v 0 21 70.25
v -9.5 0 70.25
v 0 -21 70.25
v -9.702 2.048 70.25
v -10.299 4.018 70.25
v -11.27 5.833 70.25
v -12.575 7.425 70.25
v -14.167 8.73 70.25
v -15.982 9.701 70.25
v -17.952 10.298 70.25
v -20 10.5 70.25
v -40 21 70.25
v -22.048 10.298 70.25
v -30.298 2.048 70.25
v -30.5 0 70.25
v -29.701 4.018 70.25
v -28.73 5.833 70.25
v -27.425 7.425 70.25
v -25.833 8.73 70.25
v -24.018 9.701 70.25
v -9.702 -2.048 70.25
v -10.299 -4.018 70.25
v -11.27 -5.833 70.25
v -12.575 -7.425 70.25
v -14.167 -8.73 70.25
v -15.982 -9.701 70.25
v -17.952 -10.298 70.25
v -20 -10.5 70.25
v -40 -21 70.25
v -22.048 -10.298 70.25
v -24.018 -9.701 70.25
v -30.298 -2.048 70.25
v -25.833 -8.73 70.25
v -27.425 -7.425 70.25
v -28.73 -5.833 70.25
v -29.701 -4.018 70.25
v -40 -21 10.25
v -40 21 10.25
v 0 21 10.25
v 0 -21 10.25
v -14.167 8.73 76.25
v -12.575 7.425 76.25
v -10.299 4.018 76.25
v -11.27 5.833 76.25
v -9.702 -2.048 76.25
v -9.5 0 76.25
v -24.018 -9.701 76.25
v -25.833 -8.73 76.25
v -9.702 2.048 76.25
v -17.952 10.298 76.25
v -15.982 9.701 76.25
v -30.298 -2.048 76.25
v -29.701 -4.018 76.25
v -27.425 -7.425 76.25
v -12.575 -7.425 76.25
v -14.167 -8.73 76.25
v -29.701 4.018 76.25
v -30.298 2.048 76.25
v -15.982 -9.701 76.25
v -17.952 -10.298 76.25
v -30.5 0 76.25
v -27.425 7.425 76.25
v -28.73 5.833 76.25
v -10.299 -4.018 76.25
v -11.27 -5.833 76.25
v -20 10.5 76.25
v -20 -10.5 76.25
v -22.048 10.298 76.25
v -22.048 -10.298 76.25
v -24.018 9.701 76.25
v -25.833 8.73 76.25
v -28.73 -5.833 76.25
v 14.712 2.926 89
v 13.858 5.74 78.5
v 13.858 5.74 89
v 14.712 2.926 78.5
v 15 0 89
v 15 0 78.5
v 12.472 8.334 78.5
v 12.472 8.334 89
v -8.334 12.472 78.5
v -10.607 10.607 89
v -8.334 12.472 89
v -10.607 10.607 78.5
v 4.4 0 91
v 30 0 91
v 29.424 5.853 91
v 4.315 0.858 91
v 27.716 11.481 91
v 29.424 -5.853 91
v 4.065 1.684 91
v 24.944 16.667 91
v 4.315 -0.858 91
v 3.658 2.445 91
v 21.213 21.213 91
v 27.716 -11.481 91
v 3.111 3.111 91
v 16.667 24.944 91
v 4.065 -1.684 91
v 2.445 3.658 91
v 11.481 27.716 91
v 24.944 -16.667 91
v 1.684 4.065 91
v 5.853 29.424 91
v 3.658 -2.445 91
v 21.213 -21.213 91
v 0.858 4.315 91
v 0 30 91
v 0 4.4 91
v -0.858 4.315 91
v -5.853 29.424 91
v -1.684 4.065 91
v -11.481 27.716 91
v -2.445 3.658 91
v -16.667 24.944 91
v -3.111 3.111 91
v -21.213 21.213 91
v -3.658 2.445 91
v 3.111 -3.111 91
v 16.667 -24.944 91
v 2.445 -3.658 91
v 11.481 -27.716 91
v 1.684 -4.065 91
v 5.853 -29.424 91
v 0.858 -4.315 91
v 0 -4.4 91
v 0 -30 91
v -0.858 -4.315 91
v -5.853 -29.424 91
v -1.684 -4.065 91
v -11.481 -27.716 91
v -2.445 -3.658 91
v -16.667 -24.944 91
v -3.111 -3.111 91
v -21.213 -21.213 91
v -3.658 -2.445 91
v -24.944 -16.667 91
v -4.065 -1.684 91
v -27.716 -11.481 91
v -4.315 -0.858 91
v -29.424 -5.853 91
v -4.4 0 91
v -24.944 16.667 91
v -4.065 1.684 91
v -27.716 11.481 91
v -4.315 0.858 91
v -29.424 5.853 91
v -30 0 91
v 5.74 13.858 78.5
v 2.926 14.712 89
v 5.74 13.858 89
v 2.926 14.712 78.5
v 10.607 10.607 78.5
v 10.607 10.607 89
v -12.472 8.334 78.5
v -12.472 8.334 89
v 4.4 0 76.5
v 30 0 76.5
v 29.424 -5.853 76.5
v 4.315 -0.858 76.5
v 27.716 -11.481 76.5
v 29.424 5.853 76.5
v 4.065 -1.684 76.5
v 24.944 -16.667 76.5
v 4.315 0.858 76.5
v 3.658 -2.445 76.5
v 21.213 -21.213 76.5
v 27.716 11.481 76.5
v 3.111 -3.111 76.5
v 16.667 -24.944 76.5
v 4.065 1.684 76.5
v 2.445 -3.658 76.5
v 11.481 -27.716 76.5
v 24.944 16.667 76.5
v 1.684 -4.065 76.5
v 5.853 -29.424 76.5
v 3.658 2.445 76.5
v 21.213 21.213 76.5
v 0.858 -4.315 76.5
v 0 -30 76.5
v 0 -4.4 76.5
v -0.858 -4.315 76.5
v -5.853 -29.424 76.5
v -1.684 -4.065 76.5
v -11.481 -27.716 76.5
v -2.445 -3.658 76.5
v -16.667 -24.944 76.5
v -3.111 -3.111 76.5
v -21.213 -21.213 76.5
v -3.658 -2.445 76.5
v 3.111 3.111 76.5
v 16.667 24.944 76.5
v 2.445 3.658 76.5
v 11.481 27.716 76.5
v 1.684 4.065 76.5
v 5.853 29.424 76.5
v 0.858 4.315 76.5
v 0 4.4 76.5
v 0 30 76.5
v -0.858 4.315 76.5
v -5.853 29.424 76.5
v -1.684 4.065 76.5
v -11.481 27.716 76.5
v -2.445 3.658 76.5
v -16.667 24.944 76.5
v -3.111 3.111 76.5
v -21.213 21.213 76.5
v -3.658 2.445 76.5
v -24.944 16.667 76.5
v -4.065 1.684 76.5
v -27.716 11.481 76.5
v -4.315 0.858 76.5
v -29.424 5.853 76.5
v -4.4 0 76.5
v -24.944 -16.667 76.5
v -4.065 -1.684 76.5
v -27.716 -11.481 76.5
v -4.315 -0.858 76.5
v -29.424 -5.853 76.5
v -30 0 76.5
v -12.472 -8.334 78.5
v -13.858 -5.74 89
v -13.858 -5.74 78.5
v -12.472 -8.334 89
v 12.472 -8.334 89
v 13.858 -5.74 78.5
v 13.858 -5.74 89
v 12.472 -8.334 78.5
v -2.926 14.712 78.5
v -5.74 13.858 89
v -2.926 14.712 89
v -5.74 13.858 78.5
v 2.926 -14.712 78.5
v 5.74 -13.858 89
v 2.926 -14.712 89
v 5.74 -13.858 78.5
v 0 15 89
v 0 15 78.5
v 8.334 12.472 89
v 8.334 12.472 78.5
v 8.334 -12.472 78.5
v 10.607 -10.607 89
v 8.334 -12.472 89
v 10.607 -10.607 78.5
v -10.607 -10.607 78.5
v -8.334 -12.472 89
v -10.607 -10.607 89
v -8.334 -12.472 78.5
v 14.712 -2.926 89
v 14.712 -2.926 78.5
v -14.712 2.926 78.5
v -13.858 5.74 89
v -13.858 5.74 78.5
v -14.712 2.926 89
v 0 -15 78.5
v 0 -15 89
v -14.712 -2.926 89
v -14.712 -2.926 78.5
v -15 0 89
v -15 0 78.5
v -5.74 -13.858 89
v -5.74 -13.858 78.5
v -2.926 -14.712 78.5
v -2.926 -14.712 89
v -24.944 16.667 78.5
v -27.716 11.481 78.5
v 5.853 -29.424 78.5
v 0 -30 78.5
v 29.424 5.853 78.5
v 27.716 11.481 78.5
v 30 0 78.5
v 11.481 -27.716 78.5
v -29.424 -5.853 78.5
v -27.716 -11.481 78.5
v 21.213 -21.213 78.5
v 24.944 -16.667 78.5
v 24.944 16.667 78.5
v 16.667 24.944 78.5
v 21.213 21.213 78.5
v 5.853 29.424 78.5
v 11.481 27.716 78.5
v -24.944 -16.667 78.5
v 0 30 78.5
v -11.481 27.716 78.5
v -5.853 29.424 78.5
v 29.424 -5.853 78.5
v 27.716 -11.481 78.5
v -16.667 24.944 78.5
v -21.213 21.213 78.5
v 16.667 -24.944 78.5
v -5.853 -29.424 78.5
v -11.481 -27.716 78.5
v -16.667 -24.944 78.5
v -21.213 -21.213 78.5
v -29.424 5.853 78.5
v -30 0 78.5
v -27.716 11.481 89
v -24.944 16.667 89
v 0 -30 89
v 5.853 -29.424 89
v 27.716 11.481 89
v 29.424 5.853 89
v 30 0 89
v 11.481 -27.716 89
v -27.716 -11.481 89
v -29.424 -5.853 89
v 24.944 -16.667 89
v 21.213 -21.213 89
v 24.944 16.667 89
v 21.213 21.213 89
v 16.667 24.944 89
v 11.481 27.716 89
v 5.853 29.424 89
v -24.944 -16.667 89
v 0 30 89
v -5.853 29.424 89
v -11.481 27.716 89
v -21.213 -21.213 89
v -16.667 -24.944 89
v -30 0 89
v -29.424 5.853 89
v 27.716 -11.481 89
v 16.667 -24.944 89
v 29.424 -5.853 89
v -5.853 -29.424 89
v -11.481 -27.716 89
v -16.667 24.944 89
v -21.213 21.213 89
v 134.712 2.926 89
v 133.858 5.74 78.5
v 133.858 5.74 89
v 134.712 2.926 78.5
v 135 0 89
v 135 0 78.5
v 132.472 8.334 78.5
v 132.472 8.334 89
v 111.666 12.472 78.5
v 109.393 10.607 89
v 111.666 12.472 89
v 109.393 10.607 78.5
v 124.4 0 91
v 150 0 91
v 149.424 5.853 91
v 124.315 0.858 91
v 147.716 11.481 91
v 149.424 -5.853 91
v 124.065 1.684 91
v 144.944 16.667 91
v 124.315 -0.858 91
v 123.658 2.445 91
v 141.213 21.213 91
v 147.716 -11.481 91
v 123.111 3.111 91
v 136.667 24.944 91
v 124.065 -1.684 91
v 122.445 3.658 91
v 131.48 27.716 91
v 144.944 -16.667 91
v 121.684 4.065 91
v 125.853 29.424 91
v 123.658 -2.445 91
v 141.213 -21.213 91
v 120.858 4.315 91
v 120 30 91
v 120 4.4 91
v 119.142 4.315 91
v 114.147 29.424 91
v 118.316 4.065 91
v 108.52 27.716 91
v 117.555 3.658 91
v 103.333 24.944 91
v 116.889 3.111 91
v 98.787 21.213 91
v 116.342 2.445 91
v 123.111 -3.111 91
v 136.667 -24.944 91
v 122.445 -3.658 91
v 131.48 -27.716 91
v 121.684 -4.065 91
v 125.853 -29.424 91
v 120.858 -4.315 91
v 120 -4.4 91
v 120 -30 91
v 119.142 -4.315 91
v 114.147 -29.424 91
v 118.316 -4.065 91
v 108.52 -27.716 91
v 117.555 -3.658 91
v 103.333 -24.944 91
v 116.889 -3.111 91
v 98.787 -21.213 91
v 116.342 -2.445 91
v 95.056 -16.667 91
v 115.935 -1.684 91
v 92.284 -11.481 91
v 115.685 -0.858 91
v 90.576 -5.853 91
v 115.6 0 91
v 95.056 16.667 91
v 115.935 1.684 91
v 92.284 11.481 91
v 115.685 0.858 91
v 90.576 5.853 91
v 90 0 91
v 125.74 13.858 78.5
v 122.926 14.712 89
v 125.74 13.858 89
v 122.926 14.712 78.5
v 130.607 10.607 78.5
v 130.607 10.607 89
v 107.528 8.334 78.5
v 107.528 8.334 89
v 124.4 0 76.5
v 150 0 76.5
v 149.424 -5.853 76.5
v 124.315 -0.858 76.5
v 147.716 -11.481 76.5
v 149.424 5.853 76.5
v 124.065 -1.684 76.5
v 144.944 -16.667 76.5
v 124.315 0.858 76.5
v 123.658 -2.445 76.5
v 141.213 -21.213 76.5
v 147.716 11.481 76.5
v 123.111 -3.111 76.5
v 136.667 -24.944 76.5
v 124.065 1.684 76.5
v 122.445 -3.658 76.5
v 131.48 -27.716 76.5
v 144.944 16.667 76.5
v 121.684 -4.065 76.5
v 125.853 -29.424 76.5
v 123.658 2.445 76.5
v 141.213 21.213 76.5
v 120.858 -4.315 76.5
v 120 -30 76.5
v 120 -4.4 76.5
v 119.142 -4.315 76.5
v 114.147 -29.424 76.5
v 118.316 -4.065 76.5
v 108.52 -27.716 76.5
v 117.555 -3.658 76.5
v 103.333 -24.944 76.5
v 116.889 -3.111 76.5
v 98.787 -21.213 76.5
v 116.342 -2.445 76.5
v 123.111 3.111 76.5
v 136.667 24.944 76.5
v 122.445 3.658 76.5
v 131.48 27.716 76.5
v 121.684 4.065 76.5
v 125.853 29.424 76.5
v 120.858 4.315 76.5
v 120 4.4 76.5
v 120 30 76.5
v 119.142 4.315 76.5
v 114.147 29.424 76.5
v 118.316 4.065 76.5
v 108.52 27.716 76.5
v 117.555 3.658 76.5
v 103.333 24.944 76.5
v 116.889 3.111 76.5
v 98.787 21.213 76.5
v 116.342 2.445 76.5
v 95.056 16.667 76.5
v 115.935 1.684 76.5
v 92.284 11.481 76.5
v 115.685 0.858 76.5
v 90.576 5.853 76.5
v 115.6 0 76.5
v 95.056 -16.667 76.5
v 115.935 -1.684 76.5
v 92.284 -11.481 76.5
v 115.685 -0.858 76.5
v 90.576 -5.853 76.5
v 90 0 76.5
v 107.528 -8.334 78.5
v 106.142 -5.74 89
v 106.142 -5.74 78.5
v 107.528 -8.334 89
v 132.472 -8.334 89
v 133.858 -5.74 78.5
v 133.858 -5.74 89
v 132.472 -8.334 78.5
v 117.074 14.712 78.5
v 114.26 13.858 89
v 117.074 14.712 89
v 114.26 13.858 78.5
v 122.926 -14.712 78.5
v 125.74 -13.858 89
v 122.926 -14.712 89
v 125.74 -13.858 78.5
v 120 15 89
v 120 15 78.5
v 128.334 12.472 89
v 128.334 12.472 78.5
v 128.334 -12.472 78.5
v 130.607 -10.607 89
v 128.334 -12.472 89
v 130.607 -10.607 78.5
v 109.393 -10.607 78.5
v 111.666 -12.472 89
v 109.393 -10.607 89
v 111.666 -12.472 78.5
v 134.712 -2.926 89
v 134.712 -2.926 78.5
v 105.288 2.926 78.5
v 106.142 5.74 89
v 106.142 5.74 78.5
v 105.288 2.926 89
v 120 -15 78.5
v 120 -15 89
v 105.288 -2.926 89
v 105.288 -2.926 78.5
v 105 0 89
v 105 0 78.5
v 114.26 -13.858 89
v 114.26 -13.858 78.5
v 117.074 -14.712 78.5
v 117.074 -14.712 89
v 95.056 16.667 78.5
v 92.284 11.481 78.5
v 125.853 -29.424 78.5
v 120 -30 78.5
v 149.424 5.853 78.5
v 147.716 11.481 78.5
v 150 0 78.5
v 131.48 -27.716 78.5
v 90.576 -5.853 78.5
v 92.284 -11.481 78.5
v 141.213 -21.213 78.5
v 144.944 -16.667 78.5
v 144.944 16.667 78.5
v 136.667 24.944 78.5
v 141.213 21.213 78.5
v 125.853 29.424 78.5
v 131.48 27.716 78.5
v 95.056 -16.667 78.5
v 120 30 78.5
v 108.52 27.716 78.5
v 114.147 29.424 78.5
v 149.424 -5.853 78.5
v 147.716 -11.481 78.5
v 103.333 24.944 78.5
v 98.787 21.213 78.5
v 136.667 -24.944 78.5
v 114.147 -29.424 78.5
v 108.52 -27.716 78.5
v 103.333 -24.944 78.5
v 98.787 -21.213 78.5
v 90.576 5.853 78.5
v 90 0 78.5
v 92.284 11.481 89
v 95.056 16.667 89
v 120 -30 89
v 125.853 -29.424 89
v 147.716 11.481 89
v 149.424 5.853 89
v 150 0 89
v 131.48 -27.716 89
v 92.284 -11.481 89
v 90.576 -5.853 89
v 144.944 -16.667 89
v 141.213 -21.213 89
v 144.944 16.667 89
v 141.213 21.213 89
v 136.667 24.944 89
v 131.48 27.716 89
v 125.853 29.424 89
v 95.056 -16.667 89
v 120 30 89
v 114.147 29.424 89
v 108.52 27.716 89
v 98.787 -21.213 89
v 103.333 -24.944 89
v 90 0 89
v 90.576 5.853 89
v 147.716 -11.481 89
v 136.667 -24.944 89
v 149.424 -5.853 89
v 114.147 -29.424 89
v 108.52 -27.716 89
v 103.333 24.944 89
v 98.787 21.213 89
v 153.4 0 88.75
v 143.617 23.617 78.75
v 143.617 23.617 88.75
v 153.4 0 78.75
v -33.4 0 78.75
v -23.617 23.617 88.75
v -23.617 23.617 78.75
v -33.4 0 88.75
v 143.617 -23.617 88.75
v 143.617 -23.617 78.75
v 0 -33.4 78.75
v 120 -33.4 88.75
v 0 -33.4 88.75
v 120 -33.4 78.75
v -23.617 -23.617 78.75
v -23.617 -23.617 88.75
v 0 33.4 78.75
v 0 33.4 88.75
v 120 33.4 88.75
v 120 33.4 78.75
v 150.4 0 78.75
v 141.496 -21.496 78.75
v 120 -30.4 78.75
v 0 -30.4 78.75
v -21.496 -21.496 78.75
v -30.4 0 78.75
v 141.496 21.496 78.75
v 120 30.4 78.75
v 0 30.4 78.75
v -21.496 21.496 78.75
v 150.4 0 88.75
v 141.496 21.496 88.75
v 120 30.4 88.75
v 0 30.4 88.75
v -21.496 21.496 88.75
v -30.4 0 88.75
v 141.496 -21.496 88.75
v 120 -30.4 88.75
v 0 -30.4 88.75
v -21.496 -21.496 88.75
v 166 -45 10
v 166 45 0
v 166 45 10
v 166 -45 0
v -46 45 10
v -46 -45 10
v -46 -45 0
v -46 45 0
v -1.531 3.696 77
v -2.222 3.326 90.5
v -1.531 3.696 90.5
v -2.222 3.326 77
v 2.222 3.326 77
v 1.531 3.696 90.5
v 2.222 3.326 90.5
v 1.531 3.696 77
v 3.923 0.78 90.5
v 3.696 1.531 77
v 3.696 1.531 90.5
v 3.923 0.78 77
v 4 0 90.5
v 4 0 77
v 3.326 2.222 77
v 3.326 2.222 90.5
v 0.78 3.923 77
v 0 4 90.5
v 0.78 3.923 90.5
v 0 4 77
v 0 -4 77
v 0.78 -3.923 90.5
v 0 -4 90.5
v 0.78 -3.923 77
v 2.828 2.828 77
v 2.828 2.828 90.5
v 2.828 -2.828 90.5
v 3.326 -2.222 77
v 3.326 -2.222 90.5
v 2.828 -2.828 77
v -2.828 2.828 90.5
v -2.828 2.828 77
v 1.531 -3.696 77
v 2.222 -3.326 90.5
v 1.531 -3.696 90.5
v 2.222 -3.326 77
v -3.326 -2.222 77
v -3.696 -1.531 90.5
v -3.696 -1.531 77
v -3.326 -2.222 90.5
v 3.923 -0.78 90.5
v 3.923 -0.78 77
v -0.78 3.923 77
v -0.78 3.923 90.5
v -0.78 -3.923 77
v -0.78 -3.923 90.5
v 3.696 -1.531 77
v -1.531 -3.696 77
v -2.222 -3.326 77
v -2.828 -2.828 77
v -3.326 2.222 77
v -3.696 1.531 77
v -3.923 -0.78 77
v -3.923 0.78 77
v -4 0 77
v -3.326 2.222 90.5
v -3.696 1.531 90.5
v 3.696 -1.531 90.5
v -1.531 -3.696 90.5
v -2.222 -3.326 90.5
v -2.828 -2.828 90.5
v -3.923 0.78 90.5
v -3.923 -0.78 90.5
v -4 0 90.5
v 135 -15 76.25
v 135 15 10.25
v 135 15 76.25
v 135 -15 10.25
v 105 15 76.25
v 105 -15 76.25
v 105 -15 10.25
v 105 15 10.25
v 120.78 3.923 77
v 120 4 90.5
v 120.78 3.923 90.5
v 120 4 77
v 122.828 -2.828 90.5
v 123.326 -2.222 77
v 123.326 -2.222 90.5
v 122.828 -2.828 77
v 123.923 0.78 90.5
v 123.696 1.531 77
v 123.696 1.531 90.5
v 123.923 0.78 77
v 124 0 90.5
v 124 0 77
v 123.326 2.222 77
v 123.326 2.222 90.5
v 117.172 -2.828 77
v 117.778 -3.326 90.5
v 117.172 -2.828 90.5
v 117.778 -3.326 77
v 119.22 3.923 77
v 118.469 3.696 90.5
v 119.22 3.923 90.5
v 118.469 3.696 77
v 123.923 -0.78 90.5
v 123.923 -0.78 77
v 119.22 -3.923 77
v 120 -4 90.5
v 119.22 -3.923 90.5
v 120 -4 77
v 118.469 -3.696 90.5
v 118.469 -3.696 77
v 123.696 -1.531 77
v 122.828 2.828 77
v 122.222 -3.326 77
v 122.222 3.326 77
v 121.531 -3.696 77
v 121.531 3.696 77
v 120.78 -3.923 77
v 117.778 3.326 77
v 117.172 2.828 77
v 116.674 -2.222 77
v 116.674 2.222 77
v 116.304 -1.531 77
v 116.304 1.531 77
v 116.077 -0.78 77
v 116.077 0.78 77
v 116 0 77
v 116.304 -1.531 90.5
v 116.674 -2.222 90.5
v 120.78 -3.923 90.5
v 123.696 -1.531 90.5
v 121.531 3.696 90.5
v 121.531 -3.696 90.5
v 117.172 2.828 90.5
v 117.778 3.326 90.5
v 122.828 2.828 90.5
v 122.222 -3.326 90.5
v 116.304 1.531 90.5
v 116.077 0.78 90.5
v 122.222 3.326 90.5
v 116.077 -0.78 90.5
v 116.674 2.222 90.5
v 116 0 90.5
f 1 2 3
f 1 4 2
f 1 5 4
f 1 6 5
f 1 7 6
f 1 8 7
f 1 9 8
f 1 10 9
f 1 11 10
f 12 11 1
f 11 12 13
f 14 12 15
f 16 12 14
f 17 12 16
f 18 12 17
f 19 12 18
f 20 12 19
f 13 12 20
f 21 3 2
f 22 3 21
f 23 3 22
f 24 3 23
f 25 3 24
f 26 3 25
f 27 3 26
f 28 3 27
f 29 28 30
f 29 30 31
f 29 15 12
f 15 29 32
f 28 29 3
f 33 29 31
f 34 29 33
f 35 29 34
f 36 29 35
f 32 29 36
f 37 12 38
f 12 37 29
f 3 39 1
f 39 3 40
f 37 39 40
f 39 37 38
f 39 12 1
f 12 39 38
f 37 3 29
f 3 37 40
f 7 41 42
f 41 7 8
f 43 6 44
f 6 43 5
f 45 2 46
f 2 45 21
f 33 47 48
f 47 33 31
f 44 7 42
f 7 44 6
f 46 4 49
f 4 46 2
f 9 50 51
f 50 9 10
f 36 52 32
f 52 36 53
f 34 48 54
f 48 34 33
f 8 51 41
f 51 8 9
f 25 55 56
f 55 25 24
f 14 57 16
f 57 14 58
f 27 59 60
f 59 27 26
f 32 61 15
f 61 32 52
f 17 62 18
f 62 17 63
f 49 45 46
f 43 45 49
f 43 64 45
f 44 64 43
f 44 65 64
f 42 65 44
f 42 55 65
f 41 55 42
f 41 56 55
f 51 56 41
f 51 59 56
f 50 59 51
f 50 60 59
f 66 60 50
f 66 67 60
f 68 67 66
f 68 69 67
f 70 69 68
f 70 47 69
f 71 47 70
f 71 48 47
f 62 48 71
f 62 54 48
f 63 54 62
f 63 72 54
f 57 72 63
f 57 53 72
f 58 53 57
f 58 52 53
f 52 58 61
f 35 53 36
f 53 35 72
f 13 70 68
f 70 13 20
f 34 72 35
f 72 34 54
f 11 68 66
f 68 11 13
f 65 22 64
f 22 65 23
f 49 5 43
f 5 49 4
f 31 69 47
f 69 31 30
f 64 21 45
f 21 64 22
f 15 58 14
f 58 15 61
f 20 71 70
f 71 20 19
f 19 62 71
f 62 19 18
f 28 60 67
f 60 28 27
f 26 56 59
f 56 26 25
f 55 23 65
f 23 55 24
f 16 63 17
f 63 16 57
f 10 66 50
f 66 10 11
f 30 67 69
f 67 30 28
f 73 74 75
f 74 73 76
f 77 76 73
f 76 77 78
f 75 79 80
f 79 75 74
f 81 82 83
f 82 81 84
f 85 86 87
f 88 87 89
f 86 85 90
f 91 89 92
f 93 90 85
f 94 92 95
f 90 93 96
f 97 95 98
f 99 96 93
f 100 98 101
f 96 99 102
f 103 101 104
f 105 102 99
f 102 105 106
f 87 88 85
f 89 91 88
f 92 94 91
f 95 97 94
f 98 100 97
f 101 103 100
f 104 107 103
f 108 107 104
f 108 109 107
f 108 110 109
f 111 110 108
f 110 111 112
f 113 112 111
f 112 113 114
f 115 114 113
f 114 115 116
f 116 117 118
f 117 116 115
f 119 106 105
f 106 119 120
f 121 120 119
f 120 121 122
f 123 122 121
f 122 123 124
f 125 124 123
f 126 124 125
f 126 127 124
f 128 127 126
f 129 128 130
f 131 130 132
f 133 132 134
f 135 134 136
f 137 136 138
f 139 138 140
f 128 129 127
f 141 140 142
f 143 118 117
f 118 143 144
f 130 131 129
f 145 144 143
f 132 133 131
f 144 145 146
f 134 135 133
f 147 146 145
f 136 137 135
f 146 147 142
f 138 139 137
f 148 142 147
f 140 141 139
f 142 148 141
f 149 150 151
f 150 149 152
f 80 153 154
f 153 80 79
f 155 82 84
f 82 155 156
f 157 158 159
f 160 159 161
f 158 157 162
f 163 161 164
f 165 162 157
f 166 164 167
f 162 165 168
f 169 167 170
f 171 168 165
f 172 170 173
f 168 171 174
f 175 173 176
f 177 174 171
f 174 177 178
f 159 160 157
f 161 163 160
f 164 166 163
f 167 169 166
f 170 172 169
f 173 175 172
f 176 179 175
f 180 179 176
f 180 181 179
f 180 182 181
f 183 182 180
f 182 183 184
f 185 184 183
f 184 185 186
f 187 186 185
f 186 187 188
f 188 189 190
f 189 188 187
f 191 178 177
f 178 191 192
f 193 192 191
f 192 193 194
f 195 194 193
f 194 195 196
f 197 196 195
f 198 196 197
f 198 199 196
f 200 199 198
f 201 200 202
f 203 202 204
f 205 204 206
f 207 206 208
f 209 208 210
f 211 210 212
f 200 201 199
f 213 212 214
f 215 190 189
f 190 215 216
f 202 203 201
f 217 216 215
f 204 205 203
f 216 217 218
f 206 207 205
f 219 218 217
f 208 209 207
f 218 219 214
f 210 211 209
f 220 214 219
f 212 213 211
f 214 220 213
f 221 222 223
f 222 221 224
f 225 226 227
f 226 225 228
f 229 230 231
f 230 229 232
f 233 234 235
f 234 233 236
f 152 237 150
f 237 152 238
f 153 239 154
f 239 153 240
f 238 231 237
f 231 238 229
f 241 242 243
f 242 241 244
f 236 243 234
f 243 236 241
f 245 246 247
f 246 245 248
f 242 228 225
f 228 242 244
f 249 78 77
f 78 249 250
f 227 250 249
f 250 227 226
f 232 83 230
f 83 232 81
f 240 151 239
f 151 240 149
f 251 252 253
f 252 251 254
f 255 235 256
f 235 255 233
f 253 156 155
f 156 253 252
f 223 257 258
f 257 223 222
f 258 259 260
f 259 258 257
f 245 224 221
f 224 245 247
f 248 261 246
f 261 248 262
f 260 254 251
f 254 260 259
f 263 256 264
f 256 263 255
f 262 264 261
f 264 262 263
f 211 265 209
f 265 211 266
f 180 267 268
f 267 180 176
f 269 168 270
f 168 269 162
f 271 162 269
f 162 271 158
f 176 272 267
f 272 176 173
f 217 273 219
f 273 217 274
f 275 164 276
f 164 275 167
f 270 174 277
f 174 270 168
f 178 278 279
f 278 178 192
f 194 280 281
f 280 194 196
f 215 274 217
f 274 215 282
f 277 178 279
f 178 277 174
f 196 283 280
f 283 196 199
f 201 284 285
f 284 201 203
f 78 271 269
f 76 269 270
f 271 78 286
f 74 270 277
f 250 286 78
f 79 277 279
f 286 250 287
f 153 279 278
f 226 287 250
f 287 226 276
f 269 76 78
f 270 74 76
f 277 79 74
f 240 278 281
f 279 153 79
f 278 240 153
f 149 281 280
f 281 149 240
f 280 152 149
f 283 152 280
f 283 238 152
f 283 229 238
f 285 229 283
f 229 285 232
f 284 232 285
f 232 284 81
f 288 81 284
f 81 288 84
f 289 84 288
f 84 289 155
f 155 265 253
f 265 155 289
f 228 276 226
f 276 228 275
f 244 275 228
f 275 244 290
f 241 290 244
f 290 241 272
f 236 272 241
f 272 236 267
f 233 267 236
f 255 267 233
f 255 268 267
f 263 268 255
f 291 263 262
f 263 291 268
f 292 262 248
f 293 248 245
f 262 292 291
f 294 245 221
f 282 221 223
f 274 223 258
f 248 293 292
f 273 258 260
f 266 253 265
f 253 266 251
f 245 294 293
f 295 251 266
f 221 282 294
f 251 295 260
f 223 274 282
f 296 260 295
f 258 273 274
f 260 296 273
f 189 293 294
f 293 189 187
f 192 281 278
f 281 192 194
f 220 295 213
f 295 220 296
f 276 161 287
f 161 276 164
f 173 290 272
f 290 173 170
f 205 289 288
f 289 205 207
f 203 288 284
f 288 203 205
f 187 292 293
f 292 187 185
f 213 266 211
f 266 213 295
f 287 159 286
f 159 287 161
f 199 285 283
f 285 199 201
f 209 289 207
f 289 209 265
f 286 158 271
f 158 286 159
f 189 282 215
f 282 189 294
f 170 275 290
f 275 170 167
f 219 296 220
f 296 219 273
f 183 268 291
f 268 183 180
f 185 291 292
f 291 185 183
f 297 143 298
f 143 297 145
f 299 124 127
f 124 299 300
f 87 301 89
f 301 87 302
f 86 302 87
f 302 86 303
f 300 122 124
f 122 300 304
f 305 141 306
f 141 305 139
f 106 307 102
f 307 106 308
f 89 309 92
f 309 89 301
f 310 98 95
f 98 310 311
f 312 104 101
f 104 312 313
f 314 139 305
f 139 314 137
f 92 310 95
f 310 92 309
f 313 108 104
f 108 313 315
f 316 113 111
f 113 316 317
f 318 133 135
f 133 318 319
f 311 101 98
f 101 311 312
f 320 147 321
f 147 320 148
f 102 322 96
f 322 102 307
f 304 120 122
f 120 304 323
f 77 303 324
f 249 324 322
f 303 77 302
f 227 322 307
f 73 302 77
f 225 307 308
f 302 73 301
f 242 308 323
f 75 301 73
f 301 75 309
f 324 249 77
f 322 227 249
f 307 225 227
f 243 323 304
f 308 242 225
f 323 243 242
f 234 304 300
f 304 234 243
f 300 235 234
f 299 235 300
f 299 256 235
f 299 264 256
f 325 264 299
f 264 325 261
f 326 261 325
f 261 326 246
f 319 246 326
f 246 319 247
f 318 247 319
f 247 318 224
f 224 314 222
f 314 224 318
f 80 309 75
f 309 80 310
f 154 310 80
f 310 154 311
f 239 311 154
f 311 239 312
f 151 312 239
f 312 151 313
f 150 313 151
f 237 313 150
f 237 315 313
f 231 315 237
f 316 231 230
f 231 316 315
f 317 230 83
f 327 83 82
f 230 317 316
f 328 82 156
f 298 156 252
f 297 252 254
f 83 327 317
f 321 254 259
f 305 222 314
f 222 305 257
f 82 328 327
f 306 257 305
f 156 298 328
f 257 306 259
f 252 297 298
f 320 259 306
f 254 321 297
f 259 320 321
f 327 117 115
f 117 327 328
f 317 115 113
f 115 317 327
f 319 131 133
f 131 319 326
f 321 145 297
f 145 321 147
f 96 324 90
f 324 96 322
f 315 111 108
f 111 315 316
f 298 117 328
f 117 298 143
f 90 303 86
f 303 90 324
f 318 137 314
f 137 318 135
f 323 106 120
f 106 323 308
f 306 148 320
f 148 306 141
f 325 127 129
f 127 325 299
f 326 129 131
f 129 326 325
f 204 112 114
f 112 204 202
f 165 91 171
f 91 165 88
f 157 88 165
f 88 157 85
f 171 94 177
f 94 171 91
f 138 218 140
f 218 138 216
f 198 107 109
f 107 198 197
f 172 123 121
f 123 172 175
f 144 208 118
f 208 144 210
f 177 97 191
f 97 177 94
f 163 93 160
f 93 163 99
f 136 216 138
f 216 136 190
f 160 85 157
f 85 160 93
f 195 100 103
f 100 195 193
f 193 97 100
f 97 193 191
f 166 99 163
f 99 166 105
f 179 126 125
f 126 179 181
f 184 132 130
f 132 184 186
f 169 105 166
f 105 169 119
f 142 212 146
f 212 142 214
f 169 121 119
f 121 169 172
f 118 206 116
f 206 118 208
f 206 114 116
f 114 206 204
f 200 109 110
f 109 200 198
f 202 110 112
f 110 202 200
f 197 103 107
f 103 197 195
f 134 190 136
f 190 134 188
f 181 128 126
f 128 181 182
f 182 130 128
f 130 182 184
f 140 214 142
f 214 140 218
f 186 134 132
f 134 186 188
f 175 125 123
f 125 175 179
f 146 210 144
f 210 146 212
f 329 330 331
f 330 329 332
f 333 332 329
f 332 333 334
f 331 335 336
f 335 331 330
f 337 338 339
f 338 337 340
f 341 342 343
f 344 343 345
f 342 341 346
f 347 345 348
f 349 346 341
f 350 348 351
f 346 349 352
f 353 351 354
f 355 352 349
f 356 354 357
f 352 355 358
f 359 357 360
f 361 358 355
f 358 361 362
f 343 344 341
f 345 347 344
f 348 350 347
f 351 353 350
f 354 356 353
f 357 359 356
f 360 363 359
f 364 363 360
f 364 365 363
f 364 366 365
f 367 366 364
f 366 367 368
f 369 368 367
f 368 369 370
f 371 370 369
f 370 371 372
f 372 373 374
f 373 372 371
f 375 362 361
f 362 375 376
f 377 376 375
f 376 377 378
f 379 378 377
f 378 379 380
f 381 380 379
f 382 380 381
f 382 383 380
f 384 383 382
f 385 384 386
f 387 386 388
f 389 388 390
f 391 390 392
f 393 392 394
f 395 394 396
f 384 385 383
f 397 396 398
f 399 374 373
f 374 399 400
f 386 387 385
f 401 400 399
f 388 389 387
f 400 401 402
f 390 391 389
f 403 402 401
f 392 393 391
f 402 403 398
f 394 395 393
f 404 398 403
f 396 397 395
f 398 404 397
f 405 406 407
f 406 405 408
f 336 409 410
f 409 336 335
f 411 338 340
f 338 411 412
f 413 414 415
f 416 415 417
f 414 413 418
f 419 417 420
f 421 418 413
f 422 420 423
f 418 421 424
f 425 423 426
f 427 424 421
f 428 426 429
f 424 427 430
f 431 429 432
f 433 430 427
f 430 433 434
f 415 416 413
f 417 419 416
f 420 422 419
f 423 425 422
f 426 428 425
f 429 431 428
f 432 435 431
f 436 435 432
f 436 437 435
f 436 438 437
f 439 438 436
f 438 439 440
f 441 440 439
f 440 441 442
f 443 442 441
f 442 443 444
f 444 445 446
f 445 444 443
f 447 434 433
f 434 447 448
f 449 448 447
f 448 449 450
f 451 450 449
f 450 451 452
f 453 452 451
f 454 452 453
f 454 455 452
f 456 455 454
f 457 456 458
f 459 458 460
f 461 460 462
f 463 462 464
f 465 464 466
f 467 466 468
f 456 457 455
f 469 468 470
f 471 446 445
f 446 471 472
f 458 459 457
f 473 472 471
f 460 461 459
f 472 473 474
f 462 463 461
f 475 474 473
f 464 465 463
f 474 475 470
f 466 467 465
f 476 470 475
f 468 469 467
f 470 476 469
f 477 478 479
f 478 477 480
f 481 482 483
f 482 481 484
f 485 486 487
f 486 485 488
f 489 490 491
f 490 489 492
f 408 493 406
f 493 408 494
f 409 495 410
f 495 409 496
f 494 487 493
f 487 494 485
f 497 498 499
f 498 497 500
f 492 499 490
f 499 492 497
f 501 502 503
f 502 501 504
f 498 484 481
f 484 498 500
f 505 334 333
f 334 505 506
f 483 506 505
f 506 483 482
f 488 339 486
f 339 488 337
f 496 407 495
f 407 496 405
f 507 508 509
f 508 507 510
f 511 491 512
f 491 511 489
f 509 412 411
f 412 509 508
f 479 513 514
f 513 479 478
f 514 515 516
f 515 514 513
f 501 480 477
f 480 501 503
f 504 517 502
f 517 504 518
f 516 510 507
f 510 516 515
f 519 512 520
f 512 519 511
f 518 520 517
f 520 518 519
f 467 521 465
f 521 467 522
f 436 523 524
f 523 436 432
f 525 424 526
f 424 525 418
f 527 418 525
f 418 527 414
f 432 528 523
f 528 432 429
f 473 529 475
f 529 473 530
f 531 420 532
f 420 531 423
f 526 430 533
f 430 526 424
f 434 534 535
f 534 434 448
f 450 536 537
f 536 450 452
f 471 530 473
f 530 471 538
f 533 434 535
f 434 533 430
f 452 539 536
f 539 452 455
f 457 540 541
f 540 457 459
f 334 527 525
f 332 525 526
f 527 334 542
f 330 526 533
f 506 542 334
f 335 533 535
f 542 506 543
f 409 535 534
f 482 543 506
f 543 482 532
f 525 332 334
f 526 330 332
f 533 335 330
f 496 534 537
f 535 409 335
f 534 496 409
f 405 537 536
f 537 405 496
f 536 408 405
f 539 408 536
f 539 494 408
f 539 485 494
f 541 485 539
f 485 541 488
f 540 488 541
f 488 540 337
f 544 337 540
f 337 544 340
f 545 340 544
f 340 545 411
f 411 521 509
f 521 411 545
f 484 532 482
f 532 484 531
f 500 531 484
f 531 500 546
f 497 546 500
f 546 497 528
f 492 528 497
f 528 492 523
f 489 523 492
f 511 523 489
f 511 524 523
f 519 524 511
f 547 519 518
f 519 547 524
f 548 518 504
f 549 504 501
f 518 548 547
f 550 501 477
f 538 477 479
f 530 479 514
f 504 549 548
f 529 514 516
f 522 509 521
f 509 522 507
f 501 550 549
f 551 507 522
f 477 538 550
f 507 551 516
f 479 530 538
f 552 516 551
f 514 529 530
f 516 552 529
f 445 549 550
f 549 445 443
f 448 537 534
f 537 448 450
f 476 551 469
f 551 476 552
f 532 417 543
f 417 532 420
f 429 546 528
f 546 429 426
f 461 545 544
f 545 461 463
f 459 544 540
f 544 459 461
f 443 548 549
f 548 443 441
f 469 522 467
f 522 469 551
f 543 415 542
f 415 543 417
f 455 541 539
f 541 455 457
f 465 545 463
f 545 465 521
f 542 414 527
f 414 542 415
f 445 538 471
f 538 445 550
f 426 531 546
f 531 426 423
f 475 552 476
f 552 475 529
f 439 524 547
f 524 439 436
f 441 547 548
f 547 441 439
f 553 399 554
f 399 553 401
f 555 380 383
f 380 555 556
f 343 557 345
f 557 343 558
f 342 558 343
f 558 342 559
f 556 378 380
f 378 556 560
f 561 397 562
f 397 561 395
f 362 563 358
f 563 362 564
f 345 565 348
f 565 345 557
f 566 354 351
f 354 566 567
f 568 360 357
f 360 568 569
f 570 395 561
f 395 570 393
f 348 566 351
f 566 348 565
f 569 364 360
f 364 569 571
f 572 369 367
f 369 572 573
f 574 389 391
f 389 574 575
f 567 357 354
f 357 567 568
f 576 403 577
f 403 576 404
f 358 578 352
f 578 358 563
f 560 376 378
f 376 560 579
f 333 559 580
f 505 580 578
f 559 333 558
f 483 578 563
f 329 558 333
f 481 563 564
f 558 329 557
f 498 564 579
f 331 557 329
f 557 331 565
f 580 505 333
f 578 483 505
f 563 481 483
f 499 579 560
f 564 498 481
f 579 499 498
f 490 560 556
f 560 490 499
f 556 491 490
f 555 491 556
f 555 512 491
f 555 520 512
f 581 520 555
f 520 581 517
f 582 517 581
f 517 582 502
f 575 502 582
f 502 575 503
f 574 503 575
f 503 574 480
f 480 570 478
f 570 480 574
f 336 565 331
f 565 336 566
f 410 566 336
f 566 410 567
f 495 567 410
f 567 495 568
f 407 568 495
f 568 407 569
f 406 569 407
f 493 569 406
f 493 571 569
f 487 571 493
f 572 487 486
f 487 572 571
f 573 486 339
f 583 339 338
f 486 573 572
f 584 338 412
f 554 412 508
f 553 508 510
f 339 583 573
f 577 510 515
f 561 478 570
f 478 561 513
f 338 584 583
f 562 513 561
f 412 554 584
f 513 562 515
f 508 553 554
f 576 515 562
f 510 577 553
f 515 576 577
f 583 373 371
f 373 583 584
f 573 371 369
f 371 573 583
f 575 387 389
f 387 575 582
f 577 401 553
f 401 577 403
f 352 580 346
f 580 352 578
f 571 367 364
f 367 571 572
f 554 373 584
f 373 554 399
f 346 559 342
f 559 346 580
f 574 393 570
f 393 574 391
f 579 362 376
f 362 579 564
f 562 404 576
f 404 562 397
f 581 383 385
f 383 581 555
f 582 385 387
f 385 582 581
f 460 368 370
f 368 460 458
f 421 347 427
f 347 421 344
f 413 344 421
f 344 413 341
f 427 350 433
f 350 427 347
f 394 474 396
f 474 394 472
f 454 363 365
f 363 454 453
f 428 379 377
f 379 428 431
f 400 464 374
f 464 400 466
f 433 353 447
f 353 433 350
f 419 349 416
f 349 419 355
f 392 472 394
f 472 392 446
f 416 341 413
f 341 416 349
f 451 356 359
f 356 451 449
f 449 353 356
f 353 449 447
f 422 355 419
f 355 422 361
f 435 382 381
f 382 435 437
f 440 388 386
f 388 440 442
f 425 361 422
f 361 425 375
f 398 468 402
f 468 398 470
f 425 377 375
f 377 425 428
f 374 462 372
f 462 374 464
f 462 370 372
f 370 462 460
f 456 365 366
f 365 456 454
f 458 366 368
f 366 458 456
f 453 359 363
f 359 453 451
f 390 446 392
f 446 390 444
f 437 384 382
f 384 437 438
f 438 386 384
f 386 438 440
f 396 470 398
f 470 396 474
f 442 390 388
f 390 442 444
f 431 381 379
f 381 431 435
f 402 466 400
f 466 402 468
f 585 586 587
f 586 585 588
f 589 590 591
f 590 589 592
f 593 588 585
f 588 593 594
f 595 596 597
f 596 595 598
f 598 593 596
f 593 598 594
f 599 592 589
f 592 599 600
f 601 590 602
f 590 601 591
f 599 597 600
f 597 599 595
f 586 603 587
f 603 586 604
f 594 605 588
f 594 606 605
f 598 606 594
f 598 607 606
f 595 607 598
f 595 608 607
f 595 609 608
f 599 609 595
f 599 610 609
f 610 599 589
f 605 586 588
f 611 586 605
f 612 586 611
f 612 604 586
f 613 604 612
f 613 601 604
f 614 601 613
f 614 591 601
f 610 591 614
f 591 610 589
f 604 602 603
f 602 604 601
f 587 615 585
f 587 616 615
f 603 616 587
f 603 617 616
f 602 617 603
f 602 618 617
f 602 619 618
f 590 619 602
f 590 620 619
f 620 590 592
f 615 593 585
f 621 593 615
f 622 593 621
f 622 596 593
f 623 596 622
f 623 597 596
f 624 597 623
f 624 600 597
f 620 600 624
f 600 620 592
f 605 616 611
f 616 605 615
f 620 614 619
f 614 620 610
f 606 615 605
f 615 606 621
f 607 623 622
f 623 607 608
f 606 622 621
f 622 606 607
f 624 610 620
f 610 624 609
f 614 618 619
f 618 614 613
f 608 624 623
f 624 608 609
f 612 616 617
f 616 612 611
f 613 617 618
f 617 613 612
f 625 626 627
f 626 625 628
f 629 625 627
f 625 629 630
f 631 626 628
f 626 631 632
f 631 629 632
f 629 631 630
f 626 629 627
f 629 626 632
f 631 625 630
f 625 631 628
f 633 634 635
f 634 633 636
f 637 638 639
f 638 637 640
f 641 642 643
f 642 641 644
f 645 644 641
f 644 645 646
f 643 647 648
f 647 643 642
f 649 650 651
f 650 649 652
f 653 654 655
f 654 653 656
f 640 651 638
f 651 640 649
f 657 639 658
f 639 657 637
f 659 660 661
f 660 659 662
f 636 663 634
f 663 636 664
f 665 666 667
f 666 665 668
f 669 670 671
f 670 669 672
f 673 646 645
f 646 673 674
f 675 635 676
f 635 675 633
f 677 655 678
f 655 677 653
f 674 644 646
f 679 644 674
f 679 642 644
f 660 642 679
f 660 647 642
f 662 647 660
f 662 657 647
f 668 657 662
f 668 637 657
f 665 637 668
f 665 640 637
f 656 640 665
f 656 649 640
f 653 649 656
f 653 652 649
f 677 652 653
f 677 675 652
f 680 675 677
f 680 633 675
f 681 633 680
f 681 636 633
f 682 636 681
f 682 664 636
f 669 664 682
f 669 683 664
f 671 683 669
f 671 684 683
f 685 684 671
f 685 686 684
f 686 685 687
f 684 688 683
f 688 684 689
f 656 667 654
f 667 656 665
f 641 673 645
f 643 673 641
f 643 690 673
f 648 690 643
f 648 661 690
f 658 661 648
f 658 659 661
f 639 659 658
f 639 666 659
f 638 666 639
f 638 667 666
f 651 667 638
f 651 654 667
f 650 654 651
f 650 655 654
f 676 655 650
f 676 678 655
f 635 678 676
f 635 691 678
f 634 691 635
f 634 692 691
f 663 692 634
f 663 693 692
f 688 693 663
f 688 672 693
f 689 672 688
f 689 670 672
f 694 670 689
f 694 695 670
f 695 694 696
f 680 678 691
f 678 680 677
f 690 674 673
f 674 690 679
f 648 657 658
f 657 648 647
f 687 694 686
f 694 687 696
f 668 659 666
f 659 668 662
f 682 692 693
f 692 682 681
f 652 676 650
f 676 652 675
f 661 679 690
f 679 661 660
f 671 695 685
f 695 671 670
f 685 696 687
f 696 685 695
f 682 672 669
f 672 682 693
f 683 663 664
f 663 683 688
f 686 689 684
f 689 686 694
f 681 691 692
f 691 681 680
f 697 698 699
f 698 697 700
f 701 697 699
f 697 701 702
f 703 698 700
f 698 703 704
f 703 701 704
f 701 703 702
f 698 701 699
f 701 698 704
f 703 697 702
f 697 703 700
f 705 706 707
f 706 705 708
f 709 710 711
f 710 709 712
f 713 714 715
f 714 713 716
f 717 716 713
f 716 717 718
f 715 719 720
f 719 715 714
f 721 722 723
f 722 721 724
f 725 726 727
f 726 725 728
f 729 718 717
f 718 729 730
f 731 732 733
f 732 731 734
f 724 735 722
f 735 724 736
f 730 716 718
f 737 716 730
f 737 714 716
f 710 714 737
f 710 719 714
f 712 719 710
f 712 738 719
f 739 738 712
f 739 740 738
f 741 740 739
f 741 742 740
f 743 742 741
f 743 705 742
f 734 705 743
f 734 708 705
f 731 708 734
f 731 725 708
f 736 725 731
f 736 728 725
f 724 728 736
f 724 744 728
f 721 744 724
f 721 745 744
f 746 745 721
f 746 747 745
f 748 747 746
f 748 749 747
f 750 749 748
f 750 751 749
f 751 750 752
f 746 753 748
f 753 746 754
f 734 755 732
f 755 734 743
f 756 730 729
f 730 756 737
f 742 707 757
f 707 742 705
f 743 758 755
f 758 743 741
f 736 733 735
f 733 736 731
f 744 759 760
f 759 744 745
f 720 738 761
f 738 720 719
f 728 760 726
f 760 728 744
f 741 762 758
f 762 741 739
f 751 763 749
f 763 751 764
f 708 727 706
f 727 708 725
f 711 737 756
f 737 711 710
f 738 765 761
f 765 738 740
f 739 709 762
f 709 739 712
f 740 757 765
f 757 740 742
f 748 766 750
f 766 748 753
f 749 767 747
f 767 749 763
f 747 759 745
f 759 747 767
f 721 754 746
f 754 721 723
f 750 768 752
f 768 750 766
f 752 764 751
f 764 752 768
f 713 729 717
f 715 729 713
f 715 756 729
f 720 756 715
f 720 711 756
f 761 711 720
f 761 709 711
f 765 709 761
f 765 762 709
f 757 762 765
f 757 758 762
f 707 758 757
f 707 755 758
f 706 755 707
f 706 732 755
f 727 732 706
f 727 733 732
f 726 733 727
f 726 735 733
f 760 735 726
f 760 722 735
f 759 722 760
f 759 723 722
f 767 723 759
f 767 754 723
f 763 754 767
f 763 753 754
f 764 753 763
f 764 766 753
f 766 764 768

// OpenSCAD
$fn = 32;

// ------------------------------------------------------------------------
// Motor belt drive: span 120 mm, pulleys d60, belt 10 mm wide
// Every part is its own module, assembly() places every instance.
// ------------------------------------------------------------------------

// --- part 1 ---
module base_plate() {
  difference() {
    translate([-106, -45, 0]) cube([212, 90, 10]);
  }
}

// --- part 2 ---
module motor() {
  union() {
    translate([-30, -21, 0]) cube([60, 42, 40]);
    translate([33, 0, 20]) rotate([0, 90, 0]) cylinder(h = 6, d = 21, center = true);
  }
}

// --- part 3 ---
module drive_shaft() {
  translate([0, 0, -6.75]) cylinder(h = 13.5, d = 8);
}

// --- part 4 ---
module pulley_drive() {
  difference() {
    union() {
      cylinder(h = 14.5, d = 30);
      cylinder(h = 2, d = 60);
      translate([0, 0, 12.5]) cylinder(h = 2, d = 60);
    }
    translate([0, 0, -1]) cylinder(h = 16.5, d = 8.8);
  }
}

// --- part 5 ---
module idler_post() {
  translate([-15, -15, 0]) cube([30, 30, 66]);
}

// --- part 6 ---
module driven_shaft() {
  translate([0, 0, -6.75]) cylinder(h = 13.5, d = 8);
}

// --- part 7 ---
module pulley_driven() {
  difference() {
    union() {
      cylinder(h = 14.5, d = 30);
      cylinder(h = 2, d = 60);
      translate([0, 0, 12.5]) cylinder(h = 2, d = 60);
    }
    translate([0, 0, -1]) cylinder(h = 16.5, d = 8.8);
  }
}

// --- part 8 ---
module drive_belt() {
  difference() {
    linear_extrude(height = 10) polygon(points = concat([for (a = [90 : 45 : 270]) [33.4 * cos(a), 33.4 * sin(a)]], [for (a = [270 : 45 : 450]) [120 + 33.4 * cos(a), 33.4 * sin(a)]]));
    translate([0, 0, -1]) linear_extrude(height = 12) polygon(points = concat([for (a = [90 : 45 : 270]) [30.4 * cos(a), 30.4 * sin(a)]], [for (a = [270 : 45 : 450]) [120 + 30.4 * cos(a), 30.4 * sin(a)]]));
  }
}

// --- assembly ---
module assembly() {
  color([0.80, 0.24, 0.20]) translate([60, 0, 0]) rotate([0, 0, 0]) base_plate();
  color([0.20, 0.45, 0.75]) translate([0, 0, 40.25]) rotate([0, 270, 0]) motor();
  color([0.25, 0.62, 0.32]) translate([0, 0, 83.75]) rotate([0, 0, 0]) drive_shaft();
  color([0.92, 0.70, 0.18]) translate([0, 0, 76.5]) rotate([0, 0, 0]) pulley_drive();
  color([0.58, 0.35, 0.70]) translate([120, 0, 10.25]) rotate([0, 0, 0]) idler_post();
  color([0.16, 0.66, 0.66]) translate([120, 0, 83.75]) rotate([0, 0, 0]) driven_shaft();
  color([0.85, 0.48, 0.18]) translate([120, 0, 76.5]) rotate([0, 0, 0]) pulley_driven();
  color([0.55, 0.60, 0.65]) translate([0, 0, 78.75]) rotate([0, 0, 0]) drive_belt();
}

assembly();
